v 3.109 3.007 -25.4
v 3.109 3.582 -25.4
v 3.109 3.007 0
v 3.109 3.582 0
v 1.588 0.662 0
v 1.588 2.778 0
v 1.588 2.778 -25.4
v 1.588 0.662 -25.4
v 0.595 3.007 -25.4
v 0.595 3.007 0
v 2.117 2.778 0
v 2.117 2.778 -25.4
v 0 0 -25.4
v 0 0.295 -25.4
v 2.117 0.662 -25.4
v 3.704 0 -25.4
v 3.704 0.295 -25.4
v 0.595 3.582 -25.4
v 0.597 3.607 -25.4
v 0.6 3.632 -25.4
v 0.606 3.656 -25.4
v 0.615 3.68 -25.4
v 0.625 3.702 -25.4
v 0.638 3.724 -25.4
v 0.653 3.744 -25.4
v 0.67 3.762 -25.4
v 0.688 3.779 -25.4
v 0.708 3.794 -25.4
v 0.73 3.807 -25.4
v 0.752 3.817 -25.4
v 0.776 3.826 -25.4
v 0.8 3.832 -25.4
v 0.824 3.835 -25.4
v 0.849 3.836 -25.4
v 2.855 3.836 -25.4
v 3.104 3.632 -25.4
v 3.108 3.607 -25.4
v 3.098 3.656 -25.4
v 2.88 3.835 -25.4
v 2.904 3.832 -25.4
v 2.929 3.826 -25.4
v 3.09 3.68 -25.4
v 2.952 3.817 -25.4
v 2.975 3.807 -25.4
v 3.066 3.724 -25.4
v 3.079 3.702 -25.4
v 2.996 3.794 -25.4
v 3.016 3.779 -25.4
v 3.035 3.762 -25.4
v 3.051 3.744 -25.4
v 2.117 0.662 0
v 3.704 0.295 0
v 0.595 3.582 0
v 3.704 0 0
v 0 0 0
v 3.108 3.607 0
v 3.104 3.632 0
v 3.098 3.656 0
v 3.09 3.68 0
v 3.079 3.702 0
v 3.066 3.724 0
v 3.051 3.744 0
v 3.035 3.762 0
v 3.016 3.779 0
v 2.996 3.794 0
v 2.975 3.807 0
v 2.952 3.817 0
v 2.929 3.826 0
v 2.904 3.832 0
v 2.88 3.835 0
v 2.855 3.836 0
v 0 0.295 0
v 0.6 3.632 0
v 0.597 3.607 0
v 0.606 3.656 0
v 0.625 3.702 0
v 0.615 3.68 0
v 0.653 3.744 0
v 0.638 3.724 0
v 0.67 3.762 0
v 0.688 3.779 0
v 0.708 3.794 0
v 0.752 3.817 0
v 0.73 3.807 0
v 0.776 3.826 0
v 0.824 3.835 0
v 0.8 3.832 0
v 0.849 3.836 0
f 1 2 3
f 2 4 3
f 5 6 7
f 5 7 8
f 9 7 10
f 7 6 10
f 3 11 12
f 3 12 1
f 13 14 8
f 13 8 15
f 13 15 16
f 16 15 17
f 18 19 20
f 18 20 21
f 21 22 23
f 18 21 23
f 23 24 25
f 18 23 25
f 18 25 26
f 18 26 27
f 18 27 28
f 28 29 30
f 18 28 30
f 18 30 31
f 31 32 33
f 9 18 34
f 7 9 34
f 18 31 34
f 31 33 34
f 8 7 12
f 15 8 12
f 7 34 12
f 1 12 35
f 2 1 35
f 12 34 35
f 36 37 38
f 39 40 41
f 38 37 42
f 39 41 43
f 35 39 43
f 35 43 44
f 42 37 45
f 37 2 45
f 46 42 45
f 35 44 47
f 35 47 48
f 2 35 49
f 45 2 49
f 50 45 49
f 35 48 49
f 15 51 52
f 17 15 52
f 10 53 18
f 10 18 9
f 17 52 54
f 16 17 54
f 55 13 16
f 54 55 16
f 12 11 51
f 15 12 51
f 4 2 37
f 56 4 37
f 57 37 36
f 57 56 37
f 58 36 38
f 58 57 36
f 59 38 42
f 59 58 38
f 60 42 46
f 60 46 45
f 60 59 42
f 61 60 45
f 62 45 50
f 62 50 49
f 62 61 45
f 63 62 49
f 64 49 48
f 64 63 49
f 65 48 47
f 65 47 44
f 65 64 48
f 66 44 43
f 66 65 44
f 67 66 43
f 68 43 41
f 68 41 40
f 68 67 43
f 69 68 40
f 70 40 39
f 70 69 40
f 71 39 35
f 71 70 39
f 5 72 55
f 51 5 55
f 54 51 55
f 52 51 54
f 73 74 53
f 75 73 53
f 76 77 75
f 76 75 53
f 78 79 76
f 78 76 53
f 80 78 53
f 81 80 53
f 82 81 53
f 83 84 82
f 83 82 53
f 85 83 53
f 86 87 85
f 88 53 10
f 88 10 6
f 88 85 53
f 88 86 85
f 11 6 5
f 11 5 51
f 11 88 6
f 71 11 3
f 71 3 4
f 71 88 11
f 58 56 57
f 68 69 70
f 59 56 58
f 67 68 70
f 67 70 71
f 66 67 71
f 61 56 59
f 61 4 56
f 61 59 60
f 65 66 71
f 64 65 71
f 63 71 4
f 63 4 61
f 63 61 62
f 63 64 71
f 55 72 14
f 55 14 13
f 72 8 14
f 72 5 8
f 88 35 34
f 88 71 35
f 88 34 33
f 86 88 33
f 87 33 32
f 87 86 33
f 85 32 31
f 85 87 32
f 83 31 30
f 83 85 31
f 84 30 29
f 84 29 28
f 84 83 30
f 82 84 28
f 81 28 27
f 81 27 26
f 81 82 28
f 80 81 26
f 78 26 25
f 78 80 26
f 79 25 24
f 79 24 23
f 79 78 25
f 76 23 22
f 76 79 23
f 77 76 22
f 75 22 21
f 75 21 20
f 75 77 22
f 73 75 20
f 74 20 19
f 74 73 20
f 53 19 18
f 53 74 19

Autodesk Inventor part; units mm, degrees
ref_plane "YZ Plane" through (0, 0, 0) normal (1, 0, 0) x (0, 1, 0)
ref_plane "XZ Plane" through (0, 0, 0) normal (0, 1, 0) x (-1, 0, 0)
ref_plane "XY Plane" through (0, 0, 0) normal (0, 0, 1) x (1, 0, 0)
sketch "Sketch1" plane through (0, 0, 0) normal (0, 0, 1) x (1, 0, 0)
  line L0 (0, 0) -> (3.7042, 0)
  line L1 (1.8521, 0) -> (1.8521, 0.6615)
  line L2 (1.8521, 0.6615) -> (2.1167, 0.6615)
  line L3 (2.1167, 0.6615) -> (3.7042, 0.295)
  line L4 (3.7042, 0.295) -> (3.7042, 0)
  line L5 (1.8521, 0.6615) -> (1.8521, 2.7781)
  line L6 (1.8521, 2.7781) -> (2.1167, 2.7781)
  line L7 (2.1167, 2.7781) -> (2.1167, 0.6615)
  line L8 (1.8521, 2.7781) -> (1.8521, 3.8365)
  line L9 (1.8521, 3.8365) -> (2.8549, 3.8365)
  line L10 (2.1167, 2.7781) -> (3.1089, 3.0072)
  line L11 (2.1167, 2.7781) -> (3.135, 2.7781) construction
  line L12 (3.1089, 3.5825) -> (3.1089, 3.0072)
  arc A0 (3.1089, 3.5825) -> (2.8549, 3.8365) centre (2.8549, 3.5825) ccw
  line L13 (3.7042, 0) -> (0, 0)
  line L14 (1.8521, 0.6615) -> (1.5875, 0.6615)
  line L15 (1.5875, 0.6615) -> (0, 0.295)
  line L16 (0, 0.295) -> (0, 0)
  line L17 (1.8521, 2.7781) -> (1.5875, 2.7781)
  line L18 (1.5875, 2.7781) -> (1.5875, 0.6615)
  line L19 (1.8521, 3.8365) -> (0.8493, 3.8365)
  line L20 (1.5875, 2.7781) -> (0.5953, 3.0072)
  line L21 (1.5875, 2.7781) -> (0.5692, 2.7781) construction
  line L22 (0.5953, 3.5825) -> (0.5953, 3.0072)
  arc A1 (0.8493, 3.8365) -> (0.5953, 3.5825) centre (0.8493, 3.5825) ccw
  dimension "d3" = 0.6615
  dimension "d4" = 0.2646
  dimension "d5" = 167
  dimension "d6" = 2.1167
  dimension "d7" = 1.0583
  dimension "d9" = 13
  dimension "d10" = 0.254
extrude "Extrusion1" add sketch "Sketch1" against normal blind 25.4
properties part number "Rail48in"
